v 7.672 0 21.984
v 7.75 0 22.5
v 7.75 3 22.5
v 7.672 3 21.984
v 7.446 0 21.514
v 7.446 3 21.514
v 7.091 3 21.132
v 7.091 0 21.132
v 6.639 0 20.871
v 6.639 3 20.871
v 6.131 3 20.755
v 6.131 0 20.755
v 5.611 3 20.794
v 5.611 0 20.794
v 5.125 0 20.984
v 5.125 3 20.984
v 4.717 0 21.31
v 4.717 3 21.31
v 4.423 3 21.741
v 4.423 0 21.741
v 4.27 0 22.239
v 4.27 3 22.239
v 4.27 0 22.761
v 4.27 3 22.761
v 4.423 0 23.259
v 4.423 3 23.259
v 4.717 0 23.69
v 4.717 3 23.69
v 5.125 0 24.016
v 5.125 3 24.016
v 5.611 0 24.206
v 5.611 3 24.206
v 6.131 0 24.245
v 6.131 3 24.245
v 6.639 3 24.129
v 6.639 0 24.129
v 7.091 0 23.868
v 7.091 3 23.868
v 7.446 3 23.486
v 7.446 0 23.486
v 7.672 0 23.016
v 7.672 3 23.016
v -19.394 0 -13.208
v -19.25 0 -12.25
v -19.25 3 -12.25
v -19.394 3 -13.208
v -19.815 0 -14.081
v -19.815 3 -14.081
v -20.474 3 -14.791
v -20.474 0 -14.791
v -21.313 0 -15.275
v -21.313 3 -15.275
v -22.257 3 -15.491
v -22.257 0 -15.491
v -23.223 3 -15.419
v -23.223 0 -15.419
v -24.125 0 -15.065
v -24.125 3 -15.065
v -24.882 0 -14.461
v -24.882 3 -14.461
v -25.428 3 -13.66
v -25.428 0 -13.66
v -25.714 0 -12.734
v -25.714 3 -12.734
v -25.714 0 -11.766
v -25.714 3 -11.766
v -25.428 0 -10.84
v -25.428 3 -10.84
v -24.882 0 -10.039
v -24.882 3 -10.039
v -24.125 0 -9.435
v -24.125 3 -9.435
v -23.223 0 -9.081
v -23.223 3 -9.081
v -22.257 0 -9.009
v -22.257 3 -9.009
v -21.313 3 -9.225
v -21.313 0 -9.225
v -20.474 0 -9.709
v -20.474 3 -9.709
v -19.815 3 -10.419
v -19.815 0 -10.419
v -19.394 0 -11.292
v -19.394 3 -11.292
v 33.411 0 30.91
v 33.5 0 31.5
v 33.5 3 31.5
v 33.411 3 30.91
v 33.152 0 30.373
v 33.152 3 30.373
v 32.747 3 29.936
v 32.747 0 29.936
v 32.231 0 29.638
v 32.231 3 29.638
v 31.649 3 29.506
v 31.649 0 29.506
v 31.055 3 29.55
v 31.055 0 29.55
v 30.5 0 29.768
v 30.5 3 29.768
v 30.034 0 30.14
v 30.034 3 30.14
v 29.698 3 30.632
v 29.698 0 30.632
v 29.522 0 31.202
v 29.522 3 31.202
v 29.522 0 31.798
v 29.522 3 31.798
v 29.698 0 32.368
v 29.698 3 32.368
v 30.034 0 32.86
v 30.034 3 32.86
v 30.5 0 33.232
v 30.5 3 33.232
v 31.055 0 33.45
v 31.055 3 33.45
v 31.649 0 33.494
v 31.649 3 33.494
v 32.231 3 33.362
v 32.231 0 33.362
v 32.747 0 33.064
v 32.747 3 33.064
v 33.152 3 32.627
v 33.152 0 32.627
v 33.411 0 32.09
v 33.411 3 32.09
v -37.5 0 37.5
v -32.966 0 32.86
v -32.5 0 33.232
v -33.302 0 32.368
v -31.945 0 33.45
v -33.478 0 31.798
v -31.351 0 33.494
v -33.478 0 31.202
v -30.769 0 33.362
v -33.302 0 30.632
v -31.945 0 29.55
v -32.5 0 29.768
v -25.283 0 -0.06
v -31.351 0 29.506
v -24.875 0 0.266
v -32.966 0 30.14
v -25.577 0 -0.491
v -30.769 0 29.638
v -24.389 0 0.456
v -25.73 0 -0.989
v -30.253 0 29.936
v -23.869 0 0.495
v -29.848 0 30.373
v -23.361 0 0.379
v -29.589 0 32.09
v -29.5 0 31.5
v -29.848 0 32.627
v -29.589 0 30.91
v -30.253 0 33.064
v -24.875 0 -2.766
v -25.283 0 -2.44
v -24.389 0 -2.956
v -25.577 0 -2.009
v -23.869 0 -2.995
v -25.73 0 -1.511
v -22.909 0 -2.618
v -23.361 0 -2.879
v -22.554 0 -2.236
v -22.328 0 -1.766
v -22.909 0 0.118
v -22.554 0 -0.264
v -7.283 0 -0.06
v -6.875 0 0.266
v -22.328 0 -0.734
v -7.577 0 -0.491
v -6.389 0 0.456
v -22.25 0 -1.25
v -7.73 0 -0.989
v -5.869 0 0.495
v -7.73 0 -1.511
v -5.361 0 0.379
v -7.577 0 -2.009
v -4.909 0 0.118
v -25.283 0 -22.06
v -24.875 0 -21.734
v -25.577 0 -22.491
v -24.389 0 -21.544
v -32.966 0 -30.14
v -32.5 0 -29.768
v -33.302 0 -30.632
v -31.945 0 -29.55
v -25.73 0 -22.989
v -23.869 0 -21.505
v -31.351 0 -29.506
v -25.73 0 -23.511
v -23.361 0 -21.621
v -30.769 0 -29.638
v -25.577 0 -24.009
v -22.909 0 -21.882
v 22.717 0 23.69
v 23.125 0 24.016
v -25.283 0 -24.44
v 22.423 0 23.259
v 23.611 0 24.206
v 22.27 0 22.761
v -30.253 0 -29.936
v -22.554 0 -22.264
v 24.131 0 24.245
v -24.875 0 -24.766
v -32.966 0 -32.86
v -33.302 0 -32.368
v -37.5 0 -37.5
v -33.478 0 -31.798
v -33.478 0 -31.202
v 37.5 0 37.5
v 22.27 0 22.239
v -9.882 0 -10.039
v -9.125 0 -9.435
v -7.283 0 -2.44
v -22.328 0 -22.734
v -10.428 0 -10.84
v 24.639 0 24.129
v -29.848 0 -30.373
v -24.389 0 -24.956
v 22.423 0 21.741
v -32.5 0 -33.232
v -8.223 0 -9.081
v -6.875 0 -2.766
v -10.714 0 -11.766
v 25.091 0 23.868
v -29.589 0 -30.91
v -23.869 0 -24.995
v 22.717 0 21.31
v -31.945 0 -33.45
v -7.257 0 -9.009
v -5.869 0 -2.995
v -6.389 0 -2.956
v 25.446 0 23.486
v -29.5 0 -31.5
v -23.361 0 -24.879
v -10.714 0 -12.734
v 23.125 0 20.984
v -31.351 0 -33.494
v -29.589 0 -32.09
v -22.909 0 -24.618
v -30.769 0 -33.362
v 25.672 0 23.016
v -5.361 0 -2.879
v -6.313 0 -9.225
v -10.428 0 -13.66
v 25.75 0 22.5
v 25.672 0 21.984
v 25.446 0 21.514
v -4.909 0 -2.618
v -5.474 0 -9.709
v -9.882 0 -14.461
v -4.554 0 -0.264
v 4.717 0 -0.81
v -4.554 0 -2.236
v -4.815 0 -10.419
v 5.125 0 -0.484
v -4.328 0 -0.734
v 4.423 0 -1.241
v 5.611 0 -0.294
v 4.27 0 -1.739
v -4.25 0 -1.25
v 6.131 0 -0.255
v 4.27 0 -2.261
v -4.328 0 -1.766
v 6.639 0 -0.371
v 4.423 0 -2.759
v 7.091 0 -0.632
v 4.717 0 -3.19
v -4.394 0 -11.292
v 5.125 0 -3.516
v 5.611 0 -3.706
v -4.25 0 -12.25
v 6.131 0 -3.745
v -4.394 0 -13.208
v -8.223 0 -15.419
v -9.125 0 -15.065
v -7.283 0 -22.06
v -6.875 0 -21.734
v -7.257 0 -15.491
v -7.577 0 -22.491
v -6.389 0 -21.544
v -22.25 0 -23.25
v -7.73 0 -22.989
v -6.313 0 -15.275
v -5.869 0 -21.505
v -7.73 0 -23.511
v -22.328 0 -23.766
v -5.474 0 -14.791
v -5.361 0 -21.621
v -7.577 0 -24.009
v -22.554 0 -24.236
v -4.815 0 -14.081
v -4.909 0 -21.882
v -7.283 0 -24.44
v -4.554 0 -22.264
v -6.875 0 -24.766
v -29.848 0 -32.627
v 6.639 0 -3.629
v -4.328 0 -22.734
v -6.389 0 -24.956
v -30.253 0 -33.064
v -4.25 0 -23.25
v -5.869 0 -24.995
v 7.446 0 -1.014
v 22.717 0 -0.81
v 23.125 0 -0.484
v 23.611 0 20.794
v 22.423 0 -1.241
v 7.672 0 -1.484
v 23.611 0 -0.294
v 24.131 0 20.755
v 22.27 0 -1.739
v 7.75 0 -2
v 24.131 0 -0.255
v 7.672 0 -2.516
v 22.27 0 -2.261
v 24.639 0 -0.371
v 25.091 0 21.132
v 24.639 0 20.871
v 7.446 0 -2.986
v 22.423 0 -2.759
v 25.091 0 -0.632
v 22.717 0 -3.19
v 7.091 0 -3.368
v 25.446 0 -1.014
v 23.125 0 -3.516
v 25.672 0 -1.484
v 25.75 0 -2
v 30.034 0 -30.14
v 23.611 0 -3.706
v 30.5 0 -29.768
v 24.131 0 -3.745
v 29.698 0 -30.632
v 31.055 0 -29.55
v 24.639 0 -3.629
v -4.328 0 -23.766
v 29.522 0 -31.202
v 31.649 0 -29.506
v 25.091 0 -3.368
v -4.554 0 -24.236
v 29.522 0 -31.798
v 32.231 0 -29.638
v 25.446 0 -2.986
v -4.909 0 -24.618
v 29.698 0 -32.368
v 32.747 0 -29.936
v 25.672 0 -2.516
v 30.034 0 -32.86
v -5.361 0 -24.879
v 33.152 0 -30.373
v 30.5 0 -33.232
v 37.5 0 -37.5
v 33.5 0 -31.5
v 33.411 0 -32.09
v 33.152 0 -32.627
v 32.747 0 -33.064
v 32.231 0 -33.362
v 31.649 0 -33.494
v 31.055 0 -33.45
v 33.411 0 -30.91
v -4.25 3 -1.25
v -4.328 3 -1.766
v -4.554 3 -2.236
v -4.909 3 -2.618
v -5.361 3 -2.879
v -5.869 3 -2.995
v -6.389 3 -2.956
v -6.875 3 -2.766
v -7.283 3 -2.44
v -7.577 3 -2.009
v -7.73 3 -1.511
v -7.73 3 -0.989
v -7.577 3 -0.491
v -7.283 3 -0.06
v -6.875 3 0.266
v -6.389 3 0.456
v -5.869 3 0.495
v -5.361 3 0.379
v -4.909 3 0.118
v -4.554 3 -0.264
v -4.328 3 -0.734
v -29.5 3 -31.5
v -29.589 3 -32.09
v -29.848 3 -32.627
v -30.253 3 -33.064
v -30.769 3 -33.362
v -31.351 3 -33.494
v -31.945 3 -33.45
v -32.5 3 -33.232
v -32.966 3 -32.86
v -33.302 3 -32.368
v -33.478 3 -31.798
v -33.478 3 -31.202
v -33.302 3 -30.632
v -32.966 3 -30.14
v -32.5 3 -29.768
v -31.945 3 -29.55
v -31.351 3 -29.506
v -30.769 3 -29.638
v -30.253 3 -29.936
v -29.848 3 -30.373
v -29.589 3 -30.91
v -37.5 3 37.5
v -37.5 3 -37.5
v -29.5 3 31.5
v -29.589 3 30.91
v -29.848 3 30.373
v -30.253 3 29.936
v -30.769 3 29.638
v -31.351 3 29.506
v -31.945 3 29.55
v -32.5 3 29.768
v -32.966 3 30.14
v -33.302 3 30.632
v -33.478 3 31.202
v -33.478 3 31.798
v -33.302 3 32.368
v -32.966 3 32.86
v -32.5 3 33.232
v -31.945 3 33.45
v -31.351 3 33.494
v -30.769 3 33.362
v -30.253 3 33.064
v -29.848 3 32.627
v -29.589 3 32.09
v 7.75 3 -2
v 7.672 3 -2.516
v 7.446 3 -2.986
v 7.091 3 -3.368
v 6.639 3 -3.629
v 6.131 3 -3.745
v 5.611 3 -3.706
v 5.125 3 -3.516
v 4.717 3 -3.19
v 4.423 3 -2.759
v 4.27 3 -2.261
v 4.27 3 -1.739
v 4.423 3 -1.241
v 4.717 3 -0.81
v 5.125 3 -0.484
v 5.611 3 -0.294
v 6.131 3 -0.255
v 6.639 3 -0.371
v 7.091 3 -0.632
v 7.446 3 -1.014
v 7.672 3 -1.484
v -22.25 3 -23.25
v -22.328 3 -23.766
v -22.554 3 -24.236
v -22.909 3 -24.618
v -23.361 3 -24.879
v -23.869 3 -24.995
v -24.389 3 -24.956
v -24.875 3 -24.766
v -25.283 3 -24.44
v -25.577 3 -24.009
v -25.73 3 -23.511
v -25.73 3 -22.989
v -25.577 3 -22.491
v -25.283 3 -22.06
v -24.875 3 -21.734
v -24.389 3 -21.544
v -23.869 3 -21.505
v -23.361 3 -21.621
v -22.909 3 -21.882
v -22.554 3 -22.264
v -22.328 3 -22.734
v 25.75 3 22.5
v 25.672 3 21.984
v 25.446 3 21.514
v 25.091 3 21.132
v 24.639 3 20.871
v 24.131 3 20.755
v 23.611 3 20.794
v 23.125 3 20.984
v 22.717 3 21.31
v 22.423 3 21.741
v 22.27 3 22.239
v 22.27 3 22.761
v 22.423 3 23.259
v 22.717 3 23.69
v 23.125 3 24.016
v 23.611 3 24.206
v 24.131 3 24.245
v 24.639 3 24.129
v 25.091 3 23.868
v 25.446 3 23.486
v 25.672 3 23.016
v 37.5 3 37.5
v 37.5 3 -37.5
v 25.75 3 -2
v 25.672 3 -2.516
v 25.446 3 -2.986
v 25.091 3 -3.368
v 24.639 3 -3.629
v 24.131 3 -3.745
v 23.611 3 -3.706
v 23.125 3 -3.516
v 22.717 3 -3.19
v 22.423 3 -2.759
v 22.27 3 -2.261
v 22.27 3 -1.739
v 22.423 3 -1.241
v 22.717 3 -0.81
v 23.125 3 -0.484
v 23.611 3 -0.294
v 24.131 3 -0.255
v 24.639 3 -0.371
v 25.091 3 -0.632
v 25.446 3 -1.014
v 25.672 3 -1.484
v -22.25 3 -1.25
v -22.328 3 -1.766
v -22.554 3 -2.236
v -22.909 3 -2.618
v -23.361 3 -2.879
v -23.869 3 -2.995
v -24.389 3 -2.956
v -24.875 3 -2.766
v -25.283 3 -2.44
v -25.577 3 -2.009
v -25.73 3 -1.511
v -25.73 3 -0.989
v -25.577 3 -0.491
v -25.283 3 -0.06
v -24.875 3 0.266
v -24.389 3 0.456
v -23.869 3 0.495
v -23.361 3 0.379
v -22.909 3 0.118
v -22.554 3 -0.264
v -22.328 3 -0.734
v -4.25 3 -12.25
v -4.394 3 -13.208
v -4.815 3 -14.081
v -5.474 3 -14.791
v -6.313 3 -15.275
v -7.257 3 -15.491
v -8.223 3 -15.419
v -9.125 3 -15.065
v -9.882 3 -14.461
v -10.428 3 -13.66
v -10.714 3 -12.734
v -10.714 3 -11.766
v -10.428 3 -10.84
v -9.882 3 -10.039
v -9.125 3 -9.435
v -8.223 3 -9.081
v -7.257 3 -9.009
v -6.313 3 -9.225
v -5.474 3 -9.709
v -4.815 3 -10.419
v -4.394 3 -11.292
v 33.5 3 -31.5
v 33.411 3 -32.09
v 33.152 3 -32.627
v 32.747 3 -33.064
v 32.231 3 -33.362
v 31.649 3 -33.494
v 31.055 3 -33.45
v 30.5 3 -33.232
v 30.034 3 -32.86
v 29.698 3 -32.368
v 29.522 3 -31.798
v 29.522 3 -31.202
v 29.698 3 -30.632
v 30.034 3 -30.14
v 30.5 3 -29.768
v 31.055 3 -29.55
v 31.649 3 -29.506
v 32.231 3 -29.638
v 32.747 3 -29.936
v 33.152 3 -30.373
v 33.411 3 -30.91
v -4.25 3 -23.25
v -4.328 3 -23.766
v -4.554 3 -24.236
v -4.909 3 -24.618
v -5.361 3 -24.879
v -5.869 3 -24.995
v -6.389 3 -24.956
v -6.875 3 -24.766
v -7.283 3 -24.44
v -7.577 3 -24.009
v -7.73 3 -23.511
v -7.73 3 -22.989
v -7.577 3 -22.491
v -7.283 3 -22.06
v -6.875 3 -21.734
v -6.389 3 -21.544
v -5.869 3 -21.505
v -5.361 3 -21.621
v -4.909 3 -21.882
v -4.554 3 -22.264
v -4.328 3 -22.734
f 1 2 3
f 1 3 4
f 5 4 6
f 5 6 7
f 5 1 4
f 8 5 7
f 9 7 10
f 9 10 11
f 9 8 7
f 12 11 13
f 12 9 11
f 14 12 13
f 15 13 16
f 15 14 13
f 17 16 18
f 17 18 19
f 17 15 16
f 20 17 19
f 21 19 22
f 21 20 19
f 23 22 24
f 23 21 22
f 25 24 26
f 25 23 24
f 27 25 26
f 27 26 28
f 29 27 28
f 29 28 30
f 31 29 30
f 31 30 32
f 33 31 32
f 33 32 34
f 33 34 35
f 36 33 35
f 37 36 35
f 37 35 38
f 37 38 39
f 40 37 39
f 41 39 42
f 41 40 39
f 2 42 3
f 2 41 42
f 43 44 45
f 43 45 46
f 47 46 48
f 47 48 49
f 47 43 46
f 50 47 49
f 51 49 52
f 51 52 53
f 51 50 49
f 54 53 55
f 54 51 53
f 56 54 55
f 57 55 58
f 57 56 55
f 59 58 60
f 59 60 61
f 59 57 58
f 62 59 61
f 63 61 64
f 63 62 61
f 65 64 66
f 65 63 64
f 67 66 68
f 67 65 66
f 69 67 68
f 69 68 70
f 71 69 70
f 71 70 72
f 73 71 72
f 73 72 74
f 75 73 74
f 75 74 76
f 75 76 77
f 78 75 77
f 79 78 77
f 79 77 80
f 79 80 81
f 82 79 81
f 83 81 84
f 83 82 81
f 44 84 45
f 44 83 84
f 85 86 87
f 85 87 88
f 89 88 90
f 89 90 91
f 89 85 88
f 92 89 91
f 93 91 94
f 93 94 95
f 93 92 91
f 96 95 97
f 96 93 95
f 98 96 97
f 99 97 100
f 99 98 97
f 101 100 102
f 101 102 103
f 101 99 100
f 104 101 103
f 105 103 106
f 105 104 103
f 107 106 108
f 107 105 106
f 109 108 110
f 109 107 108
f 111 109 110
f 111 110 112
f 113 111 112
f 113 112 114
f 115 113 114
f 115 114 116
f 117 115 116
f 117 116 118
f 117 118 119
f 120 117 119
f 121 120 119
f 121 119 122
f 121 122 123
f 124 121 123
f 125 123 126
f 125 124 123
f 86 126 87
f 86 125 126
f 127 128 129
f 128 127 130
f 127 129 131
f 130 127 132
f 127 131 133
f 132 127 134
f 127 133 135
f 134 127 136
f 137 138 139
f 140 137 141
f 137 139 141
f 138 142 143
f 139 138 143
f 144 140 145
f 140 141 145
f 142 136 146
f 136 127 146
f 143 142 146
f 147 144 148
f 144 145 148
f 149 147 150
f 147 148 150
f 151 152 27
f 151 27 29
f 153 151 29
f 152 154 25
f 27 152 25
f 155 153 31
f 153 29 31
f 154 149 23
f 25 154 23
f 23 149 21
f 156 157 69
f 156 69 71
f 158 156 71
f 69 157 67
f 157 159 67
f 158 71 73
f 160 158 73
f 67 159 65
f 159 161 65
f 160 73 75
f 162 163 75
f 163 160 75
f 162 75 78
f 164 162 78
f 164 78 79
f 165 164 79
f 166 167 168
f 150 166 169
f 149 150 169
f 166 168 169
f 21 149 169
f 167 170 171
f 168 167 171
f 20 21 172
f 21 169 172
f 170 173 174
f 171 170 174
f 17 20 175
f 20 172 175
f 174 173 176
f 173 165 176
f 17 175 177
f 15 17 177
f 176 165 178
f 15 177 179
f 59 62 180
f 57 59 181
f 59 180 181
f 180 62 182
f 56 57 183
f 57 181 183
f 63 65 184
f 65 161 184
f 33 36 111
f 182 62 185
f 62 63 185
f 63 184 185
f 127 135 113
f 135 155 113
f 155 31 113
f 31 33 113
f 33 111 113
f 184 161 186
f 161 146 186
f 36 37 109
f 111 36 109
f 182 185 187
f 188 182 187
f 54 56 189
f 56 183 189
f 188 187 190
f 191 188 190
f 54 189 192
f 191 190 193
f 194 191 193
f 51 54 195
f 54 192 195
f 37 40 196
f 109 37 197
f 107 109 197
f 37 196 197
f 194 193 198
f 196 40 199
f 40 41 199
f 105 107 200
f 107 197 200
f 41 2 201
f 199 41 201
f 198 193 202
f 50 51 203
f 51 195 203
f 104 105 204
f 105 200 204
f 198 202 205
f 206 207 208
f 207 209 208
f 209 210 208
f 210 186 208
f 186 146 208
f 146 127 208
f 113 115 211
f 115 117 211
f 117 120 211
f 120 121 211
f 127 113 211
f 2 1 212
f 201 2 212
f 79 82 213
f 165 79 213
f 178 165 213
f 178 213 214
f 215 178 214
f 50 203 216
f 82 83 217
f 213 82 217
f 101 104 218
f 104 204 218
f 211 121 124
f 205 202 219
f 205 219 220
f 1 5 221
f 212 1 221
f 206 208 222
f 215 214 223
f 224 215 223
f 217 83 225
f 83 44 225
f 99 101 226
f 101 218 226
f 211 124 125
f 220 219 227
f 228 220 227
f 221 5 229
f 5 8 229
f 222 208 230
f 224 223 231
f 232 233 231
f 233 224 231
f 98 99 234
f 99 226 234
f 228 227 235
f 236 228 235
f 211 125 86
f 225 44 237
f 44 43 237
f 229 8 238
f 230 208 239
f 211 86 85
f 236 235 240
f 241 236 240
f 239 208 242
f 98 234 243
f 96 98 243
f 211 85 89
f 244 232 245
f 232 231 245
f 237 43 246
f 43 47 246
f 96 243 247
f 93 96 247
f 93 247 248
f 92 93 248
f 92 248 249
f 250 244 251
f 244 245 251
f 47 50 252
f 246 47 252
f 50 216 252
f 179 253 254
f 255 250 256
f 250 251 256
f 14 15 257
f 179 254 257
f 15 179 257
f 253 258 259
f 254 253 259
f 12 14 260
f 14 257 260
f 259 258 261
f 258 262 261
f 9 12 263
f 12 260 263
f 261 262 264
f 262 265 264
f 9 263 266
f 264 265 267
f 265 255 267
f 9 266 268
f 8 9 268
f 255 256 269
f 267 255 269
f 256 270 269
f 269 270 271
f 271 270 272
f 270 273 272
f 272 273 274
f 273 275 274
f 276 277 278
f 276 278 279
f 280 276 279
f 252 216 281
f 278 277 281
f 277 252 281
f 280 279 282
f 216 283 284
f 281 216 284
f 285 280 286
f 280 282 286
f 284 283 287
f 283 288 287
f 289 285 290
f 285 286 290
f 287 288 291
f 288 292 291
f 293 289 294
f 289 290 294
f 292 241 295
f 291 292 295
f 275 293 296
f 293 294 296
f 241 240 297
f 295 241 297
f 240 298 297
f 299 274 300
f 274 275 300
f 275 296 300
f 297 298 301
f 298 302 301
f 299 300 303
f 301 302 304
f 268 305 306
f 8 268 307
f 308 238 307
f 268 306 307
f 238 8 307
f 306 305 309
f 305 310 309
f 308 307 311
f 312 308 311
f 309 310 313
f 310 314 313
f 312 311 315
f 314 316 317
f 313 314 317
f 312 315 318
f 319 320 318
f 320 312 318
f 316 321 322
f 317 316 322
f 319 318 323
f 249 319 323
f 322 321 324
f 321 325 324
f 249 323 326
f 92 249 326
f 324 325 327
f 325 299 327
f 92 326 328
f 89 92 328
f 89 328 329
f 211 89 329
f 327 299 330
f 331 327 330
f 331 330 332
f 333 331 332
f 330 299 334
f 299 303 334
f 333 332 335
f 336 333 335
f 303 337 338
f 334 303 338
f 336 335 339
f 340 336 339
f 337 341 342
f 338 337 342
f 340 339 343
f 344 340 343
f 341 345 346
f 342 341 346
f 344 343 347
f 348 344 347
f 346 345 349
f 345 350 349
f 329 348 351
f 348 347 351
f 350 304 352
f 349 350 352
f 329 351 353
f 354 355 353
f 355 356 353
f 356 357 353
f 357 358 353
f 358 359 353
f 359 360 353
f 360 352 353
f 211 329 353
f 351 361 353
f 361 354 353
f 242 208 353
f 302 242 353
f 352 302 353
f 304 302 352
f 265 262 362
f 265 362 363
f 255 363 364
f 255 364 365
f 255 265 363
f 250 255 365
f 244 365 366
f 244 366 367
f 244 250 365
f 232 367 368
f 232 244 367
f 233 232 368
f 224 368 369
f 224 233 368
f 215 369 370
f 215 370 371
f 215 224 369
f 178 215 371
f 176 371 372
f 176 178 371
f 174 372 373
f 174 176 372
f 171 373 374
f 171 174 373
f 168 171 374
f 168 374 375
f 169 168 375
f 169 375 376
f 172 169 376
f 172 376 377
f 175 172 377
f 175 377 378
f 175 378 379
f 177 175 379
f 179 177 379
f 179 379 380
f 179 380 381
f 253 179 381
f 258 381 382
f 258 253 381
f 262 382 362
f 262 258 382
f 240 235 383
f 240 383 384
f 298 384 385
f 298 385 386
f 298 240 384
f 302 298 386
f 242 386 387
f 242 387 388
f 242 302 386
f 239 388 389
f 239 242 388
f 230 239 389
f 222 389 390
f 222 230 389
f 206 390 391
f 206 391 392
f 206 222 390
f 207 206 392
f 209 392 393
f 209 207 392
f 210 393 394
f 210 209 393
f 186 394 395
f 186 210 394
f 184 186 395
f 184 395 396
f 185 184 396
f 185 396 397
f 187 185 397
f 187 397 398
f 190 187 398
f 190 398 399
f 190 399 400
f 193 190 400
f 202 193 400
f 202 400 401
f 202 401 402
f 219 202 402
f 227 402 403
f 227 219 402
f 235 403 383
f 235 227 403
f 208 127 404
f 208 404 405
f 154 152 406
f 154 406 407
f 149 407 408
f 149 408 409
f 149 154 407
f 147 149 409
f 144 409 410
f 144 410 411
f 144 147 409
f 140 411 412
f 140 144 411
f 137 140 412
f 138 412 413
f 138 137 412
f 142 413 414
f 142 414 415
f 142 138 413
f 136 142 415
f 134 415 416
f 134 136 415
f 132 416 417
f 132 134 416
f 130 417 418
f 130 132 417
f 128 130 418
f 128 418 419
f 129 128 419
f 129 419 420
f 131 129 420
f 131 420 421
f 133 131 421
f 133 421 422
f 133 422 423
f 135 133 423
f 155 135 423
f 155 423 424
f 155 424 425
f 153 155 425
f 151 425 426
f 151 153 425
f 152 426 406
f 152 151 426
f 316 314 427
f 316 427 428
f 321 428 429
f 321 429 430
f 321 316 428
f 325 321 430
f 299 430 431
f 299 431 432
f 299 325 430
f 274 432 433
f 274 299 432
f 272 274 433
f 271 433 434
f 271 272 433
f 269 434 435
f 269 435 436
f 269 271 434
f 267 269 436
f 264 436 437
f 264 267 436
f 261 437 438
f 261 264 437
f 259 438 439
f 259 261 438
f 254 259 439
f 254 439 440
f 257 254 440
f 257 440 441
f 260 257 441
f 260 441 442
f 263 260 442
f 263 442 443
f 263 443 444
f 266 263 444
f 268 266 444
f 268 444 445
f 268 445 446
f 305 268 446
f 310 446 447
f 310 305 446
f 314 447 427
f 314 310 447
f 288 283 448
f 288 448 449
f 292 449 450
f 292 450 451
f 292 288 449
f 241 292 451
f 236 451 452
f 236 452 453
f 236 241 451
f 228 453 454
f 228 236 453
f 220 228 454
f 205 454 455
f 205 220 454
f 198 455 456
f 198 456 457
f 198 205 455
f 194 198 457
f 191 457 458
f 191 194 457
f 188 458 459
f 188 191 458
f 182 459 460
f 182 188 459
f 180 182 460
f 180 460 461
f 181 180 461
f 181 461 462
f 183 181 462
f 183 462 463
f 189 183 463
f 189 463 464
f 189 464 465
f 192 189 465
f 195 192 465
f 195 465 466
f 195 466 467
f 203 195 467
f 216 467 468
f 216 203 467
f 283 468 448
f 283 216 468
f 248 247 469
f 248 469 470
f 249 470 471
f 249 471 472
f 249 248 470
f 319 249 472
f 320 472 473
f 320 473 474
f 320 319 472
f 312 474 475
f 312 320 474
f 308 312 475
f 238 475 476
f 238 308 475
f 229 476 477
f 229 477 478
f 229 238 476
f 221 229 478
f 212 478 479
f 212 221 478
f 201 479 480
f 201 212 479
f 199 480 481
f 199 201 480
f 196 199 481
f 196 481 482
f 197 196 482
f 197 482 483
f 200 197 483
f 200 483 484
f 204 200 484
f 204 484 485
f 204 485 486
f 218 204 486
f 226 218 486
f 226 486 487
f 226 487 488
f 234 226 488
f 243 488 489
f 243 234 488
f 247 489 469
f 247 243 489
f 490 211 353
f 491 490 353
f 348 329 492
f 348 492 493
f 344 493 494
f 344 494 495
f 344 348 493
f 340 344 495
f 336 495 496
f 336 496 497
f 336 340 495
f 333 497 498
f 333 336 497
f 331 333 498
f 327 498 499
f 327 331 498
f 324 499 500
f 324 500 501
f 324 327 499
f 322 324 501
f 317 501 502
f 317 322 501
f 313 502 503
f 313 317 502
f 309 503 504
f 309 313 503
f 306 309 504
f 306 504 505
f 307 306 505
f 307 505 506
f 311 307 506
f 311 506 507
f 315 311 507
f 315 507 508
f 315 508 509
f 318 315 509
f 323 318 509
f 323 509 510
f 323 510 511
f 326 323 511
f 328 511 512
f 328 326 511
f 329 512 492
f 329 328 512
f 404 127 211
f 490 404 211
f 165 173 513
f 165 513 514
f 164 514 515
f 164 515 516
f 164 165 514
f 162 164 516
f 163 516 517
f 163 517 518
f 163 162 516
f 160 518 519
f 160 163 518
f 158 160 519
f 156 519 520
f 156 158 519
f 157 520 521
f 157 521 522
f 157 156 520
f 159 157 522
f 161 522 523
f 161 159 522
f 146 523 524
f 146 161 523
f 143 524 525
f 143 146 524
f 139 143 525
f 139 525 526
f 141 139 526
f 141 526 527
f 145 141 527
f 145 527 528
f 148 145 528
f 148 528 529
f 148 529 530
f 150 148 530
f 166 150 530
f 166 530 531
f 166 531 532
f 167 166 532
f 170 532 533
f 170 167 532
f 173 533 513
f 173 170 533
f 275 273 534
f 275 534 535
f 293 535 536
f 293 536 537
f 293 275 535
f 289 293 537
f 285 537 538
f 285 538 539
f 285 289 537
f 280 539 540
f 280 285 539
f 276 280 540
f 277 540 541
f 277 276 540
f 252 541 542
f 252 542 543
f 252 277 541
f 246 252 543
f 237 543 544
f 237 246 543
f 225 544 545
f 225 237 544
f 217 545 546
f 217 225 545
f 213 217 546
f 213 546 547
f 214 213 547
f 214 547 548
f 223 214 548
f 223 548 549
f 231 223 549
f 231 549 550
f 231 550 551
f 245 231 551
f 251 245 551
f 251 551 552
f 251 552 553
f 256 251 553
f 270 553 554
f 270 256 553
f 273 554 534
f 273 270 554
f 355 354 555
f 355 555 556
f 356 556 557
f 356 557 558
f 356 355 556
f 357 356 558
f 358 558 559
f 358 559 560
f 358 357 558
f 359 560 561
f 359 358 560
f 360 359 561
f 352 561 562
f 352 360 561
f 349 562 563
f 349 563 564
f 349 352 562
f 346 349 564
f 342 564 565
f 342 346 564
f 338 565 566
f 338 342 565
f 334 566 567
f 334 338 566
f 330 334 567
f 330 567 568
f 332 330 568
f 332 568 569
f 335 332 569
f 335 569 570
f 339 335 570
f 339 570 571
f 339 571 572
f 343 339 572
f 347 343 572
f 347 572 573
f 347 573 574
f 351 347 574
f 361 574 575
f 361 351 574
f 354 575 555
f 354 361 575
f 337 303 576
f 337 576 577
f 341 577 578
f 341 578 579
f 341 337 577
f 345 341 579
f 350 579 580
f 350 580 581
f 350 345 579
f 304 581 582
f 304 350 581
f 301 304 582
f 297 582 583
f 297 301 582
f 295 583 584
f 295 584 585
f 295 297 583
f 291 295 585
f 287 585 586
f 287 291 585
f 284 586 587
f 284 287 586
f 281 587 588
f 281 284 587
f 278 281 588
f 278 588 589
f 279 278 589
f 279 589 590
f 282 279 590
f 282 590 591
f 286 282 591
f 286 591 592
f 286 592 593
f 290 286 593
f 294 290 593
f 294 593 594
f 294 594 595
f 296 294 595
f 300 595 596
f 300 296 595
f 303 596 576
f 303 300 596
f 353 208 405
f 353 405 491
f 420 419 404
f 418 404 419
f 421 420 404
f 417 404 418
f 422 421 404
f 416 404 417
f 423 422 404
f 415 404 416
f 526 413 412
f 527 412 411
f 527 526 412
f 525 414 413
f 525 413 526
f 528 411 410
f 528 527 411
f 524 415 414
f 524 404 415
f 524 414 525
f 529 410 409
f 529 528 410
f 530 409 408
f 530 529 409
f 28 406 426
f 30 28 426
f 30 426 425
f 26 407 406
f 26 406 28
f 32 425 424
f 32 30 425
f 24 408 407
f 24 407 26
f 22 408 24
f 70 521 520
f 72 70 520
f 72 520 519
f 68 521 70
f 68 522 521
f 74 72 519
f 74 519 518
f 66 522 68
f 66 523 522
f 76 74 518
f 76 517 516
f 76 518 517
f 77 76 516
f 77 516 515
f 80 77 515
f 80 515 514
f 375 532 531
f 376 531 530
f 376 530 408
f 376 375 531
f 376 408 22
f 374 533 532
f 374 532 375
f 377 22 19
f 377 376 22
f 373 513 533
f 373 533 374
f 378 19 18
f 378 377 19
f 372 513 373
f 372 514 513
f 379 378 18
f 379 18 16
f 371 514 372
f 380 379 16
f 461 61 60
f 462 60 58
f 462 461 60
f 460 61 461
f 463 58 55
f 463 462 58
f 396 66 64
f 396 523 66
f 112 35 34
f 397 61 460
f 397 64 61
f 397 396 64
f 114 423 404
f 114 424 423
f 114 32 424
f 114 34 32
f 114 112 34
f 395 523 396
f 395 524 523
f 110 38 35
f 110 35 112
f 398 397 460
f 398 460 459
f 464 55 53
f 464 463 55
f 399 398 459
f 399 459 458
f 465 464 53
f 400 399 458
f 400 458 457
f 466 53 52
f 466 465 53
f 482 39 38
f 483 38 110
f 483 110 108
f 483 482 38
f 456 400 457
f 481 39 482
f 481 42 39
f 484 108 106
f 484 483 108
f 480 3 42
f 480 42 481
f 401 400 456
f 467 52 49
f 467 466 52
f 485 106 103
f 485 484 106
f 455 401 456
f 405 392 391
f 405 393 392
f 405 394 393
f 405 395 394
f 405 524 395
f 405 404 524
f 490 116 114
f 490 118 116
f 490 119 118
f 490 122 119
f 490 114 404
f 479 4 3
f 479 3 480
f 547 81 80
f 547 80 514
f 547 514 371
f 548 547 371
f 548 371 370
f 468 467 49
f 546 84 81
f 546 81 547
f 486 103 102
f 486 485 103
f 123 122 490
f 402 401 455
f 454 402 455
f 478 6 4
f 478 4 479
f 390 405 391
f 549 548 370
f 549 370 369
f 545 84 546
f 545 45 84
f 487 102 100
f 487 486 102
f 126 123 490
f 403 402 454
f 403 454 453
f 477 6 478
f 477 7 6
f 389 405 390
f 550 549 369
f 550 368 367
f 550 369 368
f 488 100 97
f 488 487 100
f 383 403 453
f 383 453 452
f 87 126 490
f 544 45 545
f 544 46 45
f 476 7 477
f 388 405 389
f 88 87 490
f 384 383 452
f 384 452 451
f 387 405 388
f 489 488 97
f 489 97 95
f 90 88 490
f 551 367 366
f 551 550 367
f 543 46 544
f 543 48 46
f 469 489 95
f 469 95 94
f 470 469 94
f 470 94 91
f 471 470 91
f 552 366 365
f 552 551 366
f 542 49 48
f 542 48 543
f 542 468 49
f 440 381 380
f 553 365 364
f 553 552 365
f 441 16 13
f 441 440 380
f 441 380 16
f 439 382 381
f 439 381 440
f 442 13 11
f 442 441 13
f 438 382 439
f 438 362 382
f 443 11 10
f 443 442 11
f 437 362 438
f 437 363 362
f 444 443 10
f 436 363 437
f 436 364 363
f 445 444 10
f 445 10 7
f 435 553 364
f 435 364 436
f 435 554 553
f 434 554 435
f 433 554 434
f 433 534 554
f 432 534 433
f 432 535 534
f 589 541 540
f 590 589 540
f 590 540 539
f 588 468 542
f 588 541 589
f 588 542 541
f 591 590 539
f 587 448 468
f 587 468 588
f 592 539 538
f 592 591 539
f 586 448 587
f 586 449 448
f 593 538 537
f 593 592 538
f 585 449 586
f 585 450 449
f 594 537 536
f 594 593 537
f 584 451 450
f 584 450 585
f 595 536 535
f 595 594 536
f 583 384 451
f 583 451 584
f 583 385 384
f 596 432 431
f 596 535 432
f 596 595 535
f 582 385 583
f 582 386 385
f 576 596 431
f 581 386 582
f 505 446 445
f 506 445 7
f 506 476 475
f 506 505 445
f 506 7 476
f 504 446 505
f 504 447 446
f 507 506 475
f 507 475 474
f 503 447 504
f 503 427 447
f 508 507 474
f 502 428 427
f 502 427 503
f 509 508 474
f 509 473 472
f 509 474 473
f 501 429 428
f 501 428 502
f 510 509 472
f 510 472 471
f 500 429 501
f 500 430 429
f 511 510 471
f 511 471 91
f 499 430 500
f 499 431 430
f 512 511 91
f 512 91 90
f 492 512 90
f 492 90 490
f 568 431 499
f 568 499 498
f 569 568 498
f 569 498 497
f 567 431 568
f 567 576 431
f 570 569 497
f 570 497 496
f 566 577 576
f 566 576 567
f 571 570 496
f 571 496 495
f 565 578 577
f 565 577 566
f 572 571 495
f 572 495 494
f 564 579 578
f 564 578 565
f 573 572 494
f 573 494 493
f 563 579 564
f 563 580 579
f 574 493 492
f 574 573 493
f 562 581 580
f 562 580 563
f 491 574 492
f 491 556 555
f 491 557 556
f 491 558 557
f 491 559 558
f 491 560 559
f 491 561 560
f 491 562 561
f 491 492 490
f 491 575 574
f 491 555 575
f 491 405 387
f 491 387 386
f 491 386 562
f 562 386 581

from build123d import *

# Parameters (mm, degrees)
SKETCH1_W           = 75
SKETCH1_H           = 75
SKETCH1_R           = 2
SKETCH1_R_2         = 3.25
SKETCH1_R_3         = 1.75
BOSS_EXTRUDE1_DEPTH = 3


with BuildPart() as part:
    # Sketch1 → Boss-Extrude1 (new body)
    with BuildSketch(Plane(origin=(0, 0, 0), x_dir=(1, 0, 0), z_dir=(0, 1, 0))):
        Rectangle(SKETCH1_W, SKETCH1_H)
        with Locations((31.5, 31.5)):
            Circle(SKETCH1_R, mode=Mode.SUBTRACT)
        with Locations((31.5, -31.5)):
            Circle(SKETCH1_R, mode=Mode.SUBTRACT)
        with Locations((-31.5, -31.5)):
            Circle(SKETCH1_R, mode=Mode.SUBTRACT)
        with Locations((-31.5, 31.5)):
            Circle(SKETCH1_R, mode=Mode.SUBTRACT)
        with Locations((-22.5, 12.25)):
            Circle(SKETCH1_R_2, mode=Mode.SUBTRACT)
        with Locations((-7.5, 12.25)):
            Circle(SKETCH1_R_2, mode=Mode.SUBTRACT)
        with Locations((-24, 23.25)):
            Circle(SKETCH1_R_3, mode=Mode.SUBTRACT)
        with Locations((-6, 23.25)):
            Circle(SKETCH1_R_3, mode=Mode.SUBTRACT)
        with Locations((-24, 1.25)):
            Circle(SKETCH1_R_3, mode=Mode.SUBTRACT)
        with Locations((-6, 1.25)):
            Circle(SKETCH1_R_3, mode=Mode.SUBTRACT)
        with Locations((6, -22.5)):
            Circle(SKETCH1_R_3, mode=Mode.SUBTRACT)
        with Locations((24, -22.5)):
            Circle(SKETCH1_R_3, mode=Mode.SUBTRACT)
        with Locations((24, 2)):
            Circle(SKETCH1_R_3, mode=Mode.SUBTRACT)
        with Locations((6, 2)):
            Circle(SKETCH1_R_3, mode=Mode.SUBTRACT)
    extrude(amount=BOSS_EXTRUDE1_DEPTH)


solid = part.part
